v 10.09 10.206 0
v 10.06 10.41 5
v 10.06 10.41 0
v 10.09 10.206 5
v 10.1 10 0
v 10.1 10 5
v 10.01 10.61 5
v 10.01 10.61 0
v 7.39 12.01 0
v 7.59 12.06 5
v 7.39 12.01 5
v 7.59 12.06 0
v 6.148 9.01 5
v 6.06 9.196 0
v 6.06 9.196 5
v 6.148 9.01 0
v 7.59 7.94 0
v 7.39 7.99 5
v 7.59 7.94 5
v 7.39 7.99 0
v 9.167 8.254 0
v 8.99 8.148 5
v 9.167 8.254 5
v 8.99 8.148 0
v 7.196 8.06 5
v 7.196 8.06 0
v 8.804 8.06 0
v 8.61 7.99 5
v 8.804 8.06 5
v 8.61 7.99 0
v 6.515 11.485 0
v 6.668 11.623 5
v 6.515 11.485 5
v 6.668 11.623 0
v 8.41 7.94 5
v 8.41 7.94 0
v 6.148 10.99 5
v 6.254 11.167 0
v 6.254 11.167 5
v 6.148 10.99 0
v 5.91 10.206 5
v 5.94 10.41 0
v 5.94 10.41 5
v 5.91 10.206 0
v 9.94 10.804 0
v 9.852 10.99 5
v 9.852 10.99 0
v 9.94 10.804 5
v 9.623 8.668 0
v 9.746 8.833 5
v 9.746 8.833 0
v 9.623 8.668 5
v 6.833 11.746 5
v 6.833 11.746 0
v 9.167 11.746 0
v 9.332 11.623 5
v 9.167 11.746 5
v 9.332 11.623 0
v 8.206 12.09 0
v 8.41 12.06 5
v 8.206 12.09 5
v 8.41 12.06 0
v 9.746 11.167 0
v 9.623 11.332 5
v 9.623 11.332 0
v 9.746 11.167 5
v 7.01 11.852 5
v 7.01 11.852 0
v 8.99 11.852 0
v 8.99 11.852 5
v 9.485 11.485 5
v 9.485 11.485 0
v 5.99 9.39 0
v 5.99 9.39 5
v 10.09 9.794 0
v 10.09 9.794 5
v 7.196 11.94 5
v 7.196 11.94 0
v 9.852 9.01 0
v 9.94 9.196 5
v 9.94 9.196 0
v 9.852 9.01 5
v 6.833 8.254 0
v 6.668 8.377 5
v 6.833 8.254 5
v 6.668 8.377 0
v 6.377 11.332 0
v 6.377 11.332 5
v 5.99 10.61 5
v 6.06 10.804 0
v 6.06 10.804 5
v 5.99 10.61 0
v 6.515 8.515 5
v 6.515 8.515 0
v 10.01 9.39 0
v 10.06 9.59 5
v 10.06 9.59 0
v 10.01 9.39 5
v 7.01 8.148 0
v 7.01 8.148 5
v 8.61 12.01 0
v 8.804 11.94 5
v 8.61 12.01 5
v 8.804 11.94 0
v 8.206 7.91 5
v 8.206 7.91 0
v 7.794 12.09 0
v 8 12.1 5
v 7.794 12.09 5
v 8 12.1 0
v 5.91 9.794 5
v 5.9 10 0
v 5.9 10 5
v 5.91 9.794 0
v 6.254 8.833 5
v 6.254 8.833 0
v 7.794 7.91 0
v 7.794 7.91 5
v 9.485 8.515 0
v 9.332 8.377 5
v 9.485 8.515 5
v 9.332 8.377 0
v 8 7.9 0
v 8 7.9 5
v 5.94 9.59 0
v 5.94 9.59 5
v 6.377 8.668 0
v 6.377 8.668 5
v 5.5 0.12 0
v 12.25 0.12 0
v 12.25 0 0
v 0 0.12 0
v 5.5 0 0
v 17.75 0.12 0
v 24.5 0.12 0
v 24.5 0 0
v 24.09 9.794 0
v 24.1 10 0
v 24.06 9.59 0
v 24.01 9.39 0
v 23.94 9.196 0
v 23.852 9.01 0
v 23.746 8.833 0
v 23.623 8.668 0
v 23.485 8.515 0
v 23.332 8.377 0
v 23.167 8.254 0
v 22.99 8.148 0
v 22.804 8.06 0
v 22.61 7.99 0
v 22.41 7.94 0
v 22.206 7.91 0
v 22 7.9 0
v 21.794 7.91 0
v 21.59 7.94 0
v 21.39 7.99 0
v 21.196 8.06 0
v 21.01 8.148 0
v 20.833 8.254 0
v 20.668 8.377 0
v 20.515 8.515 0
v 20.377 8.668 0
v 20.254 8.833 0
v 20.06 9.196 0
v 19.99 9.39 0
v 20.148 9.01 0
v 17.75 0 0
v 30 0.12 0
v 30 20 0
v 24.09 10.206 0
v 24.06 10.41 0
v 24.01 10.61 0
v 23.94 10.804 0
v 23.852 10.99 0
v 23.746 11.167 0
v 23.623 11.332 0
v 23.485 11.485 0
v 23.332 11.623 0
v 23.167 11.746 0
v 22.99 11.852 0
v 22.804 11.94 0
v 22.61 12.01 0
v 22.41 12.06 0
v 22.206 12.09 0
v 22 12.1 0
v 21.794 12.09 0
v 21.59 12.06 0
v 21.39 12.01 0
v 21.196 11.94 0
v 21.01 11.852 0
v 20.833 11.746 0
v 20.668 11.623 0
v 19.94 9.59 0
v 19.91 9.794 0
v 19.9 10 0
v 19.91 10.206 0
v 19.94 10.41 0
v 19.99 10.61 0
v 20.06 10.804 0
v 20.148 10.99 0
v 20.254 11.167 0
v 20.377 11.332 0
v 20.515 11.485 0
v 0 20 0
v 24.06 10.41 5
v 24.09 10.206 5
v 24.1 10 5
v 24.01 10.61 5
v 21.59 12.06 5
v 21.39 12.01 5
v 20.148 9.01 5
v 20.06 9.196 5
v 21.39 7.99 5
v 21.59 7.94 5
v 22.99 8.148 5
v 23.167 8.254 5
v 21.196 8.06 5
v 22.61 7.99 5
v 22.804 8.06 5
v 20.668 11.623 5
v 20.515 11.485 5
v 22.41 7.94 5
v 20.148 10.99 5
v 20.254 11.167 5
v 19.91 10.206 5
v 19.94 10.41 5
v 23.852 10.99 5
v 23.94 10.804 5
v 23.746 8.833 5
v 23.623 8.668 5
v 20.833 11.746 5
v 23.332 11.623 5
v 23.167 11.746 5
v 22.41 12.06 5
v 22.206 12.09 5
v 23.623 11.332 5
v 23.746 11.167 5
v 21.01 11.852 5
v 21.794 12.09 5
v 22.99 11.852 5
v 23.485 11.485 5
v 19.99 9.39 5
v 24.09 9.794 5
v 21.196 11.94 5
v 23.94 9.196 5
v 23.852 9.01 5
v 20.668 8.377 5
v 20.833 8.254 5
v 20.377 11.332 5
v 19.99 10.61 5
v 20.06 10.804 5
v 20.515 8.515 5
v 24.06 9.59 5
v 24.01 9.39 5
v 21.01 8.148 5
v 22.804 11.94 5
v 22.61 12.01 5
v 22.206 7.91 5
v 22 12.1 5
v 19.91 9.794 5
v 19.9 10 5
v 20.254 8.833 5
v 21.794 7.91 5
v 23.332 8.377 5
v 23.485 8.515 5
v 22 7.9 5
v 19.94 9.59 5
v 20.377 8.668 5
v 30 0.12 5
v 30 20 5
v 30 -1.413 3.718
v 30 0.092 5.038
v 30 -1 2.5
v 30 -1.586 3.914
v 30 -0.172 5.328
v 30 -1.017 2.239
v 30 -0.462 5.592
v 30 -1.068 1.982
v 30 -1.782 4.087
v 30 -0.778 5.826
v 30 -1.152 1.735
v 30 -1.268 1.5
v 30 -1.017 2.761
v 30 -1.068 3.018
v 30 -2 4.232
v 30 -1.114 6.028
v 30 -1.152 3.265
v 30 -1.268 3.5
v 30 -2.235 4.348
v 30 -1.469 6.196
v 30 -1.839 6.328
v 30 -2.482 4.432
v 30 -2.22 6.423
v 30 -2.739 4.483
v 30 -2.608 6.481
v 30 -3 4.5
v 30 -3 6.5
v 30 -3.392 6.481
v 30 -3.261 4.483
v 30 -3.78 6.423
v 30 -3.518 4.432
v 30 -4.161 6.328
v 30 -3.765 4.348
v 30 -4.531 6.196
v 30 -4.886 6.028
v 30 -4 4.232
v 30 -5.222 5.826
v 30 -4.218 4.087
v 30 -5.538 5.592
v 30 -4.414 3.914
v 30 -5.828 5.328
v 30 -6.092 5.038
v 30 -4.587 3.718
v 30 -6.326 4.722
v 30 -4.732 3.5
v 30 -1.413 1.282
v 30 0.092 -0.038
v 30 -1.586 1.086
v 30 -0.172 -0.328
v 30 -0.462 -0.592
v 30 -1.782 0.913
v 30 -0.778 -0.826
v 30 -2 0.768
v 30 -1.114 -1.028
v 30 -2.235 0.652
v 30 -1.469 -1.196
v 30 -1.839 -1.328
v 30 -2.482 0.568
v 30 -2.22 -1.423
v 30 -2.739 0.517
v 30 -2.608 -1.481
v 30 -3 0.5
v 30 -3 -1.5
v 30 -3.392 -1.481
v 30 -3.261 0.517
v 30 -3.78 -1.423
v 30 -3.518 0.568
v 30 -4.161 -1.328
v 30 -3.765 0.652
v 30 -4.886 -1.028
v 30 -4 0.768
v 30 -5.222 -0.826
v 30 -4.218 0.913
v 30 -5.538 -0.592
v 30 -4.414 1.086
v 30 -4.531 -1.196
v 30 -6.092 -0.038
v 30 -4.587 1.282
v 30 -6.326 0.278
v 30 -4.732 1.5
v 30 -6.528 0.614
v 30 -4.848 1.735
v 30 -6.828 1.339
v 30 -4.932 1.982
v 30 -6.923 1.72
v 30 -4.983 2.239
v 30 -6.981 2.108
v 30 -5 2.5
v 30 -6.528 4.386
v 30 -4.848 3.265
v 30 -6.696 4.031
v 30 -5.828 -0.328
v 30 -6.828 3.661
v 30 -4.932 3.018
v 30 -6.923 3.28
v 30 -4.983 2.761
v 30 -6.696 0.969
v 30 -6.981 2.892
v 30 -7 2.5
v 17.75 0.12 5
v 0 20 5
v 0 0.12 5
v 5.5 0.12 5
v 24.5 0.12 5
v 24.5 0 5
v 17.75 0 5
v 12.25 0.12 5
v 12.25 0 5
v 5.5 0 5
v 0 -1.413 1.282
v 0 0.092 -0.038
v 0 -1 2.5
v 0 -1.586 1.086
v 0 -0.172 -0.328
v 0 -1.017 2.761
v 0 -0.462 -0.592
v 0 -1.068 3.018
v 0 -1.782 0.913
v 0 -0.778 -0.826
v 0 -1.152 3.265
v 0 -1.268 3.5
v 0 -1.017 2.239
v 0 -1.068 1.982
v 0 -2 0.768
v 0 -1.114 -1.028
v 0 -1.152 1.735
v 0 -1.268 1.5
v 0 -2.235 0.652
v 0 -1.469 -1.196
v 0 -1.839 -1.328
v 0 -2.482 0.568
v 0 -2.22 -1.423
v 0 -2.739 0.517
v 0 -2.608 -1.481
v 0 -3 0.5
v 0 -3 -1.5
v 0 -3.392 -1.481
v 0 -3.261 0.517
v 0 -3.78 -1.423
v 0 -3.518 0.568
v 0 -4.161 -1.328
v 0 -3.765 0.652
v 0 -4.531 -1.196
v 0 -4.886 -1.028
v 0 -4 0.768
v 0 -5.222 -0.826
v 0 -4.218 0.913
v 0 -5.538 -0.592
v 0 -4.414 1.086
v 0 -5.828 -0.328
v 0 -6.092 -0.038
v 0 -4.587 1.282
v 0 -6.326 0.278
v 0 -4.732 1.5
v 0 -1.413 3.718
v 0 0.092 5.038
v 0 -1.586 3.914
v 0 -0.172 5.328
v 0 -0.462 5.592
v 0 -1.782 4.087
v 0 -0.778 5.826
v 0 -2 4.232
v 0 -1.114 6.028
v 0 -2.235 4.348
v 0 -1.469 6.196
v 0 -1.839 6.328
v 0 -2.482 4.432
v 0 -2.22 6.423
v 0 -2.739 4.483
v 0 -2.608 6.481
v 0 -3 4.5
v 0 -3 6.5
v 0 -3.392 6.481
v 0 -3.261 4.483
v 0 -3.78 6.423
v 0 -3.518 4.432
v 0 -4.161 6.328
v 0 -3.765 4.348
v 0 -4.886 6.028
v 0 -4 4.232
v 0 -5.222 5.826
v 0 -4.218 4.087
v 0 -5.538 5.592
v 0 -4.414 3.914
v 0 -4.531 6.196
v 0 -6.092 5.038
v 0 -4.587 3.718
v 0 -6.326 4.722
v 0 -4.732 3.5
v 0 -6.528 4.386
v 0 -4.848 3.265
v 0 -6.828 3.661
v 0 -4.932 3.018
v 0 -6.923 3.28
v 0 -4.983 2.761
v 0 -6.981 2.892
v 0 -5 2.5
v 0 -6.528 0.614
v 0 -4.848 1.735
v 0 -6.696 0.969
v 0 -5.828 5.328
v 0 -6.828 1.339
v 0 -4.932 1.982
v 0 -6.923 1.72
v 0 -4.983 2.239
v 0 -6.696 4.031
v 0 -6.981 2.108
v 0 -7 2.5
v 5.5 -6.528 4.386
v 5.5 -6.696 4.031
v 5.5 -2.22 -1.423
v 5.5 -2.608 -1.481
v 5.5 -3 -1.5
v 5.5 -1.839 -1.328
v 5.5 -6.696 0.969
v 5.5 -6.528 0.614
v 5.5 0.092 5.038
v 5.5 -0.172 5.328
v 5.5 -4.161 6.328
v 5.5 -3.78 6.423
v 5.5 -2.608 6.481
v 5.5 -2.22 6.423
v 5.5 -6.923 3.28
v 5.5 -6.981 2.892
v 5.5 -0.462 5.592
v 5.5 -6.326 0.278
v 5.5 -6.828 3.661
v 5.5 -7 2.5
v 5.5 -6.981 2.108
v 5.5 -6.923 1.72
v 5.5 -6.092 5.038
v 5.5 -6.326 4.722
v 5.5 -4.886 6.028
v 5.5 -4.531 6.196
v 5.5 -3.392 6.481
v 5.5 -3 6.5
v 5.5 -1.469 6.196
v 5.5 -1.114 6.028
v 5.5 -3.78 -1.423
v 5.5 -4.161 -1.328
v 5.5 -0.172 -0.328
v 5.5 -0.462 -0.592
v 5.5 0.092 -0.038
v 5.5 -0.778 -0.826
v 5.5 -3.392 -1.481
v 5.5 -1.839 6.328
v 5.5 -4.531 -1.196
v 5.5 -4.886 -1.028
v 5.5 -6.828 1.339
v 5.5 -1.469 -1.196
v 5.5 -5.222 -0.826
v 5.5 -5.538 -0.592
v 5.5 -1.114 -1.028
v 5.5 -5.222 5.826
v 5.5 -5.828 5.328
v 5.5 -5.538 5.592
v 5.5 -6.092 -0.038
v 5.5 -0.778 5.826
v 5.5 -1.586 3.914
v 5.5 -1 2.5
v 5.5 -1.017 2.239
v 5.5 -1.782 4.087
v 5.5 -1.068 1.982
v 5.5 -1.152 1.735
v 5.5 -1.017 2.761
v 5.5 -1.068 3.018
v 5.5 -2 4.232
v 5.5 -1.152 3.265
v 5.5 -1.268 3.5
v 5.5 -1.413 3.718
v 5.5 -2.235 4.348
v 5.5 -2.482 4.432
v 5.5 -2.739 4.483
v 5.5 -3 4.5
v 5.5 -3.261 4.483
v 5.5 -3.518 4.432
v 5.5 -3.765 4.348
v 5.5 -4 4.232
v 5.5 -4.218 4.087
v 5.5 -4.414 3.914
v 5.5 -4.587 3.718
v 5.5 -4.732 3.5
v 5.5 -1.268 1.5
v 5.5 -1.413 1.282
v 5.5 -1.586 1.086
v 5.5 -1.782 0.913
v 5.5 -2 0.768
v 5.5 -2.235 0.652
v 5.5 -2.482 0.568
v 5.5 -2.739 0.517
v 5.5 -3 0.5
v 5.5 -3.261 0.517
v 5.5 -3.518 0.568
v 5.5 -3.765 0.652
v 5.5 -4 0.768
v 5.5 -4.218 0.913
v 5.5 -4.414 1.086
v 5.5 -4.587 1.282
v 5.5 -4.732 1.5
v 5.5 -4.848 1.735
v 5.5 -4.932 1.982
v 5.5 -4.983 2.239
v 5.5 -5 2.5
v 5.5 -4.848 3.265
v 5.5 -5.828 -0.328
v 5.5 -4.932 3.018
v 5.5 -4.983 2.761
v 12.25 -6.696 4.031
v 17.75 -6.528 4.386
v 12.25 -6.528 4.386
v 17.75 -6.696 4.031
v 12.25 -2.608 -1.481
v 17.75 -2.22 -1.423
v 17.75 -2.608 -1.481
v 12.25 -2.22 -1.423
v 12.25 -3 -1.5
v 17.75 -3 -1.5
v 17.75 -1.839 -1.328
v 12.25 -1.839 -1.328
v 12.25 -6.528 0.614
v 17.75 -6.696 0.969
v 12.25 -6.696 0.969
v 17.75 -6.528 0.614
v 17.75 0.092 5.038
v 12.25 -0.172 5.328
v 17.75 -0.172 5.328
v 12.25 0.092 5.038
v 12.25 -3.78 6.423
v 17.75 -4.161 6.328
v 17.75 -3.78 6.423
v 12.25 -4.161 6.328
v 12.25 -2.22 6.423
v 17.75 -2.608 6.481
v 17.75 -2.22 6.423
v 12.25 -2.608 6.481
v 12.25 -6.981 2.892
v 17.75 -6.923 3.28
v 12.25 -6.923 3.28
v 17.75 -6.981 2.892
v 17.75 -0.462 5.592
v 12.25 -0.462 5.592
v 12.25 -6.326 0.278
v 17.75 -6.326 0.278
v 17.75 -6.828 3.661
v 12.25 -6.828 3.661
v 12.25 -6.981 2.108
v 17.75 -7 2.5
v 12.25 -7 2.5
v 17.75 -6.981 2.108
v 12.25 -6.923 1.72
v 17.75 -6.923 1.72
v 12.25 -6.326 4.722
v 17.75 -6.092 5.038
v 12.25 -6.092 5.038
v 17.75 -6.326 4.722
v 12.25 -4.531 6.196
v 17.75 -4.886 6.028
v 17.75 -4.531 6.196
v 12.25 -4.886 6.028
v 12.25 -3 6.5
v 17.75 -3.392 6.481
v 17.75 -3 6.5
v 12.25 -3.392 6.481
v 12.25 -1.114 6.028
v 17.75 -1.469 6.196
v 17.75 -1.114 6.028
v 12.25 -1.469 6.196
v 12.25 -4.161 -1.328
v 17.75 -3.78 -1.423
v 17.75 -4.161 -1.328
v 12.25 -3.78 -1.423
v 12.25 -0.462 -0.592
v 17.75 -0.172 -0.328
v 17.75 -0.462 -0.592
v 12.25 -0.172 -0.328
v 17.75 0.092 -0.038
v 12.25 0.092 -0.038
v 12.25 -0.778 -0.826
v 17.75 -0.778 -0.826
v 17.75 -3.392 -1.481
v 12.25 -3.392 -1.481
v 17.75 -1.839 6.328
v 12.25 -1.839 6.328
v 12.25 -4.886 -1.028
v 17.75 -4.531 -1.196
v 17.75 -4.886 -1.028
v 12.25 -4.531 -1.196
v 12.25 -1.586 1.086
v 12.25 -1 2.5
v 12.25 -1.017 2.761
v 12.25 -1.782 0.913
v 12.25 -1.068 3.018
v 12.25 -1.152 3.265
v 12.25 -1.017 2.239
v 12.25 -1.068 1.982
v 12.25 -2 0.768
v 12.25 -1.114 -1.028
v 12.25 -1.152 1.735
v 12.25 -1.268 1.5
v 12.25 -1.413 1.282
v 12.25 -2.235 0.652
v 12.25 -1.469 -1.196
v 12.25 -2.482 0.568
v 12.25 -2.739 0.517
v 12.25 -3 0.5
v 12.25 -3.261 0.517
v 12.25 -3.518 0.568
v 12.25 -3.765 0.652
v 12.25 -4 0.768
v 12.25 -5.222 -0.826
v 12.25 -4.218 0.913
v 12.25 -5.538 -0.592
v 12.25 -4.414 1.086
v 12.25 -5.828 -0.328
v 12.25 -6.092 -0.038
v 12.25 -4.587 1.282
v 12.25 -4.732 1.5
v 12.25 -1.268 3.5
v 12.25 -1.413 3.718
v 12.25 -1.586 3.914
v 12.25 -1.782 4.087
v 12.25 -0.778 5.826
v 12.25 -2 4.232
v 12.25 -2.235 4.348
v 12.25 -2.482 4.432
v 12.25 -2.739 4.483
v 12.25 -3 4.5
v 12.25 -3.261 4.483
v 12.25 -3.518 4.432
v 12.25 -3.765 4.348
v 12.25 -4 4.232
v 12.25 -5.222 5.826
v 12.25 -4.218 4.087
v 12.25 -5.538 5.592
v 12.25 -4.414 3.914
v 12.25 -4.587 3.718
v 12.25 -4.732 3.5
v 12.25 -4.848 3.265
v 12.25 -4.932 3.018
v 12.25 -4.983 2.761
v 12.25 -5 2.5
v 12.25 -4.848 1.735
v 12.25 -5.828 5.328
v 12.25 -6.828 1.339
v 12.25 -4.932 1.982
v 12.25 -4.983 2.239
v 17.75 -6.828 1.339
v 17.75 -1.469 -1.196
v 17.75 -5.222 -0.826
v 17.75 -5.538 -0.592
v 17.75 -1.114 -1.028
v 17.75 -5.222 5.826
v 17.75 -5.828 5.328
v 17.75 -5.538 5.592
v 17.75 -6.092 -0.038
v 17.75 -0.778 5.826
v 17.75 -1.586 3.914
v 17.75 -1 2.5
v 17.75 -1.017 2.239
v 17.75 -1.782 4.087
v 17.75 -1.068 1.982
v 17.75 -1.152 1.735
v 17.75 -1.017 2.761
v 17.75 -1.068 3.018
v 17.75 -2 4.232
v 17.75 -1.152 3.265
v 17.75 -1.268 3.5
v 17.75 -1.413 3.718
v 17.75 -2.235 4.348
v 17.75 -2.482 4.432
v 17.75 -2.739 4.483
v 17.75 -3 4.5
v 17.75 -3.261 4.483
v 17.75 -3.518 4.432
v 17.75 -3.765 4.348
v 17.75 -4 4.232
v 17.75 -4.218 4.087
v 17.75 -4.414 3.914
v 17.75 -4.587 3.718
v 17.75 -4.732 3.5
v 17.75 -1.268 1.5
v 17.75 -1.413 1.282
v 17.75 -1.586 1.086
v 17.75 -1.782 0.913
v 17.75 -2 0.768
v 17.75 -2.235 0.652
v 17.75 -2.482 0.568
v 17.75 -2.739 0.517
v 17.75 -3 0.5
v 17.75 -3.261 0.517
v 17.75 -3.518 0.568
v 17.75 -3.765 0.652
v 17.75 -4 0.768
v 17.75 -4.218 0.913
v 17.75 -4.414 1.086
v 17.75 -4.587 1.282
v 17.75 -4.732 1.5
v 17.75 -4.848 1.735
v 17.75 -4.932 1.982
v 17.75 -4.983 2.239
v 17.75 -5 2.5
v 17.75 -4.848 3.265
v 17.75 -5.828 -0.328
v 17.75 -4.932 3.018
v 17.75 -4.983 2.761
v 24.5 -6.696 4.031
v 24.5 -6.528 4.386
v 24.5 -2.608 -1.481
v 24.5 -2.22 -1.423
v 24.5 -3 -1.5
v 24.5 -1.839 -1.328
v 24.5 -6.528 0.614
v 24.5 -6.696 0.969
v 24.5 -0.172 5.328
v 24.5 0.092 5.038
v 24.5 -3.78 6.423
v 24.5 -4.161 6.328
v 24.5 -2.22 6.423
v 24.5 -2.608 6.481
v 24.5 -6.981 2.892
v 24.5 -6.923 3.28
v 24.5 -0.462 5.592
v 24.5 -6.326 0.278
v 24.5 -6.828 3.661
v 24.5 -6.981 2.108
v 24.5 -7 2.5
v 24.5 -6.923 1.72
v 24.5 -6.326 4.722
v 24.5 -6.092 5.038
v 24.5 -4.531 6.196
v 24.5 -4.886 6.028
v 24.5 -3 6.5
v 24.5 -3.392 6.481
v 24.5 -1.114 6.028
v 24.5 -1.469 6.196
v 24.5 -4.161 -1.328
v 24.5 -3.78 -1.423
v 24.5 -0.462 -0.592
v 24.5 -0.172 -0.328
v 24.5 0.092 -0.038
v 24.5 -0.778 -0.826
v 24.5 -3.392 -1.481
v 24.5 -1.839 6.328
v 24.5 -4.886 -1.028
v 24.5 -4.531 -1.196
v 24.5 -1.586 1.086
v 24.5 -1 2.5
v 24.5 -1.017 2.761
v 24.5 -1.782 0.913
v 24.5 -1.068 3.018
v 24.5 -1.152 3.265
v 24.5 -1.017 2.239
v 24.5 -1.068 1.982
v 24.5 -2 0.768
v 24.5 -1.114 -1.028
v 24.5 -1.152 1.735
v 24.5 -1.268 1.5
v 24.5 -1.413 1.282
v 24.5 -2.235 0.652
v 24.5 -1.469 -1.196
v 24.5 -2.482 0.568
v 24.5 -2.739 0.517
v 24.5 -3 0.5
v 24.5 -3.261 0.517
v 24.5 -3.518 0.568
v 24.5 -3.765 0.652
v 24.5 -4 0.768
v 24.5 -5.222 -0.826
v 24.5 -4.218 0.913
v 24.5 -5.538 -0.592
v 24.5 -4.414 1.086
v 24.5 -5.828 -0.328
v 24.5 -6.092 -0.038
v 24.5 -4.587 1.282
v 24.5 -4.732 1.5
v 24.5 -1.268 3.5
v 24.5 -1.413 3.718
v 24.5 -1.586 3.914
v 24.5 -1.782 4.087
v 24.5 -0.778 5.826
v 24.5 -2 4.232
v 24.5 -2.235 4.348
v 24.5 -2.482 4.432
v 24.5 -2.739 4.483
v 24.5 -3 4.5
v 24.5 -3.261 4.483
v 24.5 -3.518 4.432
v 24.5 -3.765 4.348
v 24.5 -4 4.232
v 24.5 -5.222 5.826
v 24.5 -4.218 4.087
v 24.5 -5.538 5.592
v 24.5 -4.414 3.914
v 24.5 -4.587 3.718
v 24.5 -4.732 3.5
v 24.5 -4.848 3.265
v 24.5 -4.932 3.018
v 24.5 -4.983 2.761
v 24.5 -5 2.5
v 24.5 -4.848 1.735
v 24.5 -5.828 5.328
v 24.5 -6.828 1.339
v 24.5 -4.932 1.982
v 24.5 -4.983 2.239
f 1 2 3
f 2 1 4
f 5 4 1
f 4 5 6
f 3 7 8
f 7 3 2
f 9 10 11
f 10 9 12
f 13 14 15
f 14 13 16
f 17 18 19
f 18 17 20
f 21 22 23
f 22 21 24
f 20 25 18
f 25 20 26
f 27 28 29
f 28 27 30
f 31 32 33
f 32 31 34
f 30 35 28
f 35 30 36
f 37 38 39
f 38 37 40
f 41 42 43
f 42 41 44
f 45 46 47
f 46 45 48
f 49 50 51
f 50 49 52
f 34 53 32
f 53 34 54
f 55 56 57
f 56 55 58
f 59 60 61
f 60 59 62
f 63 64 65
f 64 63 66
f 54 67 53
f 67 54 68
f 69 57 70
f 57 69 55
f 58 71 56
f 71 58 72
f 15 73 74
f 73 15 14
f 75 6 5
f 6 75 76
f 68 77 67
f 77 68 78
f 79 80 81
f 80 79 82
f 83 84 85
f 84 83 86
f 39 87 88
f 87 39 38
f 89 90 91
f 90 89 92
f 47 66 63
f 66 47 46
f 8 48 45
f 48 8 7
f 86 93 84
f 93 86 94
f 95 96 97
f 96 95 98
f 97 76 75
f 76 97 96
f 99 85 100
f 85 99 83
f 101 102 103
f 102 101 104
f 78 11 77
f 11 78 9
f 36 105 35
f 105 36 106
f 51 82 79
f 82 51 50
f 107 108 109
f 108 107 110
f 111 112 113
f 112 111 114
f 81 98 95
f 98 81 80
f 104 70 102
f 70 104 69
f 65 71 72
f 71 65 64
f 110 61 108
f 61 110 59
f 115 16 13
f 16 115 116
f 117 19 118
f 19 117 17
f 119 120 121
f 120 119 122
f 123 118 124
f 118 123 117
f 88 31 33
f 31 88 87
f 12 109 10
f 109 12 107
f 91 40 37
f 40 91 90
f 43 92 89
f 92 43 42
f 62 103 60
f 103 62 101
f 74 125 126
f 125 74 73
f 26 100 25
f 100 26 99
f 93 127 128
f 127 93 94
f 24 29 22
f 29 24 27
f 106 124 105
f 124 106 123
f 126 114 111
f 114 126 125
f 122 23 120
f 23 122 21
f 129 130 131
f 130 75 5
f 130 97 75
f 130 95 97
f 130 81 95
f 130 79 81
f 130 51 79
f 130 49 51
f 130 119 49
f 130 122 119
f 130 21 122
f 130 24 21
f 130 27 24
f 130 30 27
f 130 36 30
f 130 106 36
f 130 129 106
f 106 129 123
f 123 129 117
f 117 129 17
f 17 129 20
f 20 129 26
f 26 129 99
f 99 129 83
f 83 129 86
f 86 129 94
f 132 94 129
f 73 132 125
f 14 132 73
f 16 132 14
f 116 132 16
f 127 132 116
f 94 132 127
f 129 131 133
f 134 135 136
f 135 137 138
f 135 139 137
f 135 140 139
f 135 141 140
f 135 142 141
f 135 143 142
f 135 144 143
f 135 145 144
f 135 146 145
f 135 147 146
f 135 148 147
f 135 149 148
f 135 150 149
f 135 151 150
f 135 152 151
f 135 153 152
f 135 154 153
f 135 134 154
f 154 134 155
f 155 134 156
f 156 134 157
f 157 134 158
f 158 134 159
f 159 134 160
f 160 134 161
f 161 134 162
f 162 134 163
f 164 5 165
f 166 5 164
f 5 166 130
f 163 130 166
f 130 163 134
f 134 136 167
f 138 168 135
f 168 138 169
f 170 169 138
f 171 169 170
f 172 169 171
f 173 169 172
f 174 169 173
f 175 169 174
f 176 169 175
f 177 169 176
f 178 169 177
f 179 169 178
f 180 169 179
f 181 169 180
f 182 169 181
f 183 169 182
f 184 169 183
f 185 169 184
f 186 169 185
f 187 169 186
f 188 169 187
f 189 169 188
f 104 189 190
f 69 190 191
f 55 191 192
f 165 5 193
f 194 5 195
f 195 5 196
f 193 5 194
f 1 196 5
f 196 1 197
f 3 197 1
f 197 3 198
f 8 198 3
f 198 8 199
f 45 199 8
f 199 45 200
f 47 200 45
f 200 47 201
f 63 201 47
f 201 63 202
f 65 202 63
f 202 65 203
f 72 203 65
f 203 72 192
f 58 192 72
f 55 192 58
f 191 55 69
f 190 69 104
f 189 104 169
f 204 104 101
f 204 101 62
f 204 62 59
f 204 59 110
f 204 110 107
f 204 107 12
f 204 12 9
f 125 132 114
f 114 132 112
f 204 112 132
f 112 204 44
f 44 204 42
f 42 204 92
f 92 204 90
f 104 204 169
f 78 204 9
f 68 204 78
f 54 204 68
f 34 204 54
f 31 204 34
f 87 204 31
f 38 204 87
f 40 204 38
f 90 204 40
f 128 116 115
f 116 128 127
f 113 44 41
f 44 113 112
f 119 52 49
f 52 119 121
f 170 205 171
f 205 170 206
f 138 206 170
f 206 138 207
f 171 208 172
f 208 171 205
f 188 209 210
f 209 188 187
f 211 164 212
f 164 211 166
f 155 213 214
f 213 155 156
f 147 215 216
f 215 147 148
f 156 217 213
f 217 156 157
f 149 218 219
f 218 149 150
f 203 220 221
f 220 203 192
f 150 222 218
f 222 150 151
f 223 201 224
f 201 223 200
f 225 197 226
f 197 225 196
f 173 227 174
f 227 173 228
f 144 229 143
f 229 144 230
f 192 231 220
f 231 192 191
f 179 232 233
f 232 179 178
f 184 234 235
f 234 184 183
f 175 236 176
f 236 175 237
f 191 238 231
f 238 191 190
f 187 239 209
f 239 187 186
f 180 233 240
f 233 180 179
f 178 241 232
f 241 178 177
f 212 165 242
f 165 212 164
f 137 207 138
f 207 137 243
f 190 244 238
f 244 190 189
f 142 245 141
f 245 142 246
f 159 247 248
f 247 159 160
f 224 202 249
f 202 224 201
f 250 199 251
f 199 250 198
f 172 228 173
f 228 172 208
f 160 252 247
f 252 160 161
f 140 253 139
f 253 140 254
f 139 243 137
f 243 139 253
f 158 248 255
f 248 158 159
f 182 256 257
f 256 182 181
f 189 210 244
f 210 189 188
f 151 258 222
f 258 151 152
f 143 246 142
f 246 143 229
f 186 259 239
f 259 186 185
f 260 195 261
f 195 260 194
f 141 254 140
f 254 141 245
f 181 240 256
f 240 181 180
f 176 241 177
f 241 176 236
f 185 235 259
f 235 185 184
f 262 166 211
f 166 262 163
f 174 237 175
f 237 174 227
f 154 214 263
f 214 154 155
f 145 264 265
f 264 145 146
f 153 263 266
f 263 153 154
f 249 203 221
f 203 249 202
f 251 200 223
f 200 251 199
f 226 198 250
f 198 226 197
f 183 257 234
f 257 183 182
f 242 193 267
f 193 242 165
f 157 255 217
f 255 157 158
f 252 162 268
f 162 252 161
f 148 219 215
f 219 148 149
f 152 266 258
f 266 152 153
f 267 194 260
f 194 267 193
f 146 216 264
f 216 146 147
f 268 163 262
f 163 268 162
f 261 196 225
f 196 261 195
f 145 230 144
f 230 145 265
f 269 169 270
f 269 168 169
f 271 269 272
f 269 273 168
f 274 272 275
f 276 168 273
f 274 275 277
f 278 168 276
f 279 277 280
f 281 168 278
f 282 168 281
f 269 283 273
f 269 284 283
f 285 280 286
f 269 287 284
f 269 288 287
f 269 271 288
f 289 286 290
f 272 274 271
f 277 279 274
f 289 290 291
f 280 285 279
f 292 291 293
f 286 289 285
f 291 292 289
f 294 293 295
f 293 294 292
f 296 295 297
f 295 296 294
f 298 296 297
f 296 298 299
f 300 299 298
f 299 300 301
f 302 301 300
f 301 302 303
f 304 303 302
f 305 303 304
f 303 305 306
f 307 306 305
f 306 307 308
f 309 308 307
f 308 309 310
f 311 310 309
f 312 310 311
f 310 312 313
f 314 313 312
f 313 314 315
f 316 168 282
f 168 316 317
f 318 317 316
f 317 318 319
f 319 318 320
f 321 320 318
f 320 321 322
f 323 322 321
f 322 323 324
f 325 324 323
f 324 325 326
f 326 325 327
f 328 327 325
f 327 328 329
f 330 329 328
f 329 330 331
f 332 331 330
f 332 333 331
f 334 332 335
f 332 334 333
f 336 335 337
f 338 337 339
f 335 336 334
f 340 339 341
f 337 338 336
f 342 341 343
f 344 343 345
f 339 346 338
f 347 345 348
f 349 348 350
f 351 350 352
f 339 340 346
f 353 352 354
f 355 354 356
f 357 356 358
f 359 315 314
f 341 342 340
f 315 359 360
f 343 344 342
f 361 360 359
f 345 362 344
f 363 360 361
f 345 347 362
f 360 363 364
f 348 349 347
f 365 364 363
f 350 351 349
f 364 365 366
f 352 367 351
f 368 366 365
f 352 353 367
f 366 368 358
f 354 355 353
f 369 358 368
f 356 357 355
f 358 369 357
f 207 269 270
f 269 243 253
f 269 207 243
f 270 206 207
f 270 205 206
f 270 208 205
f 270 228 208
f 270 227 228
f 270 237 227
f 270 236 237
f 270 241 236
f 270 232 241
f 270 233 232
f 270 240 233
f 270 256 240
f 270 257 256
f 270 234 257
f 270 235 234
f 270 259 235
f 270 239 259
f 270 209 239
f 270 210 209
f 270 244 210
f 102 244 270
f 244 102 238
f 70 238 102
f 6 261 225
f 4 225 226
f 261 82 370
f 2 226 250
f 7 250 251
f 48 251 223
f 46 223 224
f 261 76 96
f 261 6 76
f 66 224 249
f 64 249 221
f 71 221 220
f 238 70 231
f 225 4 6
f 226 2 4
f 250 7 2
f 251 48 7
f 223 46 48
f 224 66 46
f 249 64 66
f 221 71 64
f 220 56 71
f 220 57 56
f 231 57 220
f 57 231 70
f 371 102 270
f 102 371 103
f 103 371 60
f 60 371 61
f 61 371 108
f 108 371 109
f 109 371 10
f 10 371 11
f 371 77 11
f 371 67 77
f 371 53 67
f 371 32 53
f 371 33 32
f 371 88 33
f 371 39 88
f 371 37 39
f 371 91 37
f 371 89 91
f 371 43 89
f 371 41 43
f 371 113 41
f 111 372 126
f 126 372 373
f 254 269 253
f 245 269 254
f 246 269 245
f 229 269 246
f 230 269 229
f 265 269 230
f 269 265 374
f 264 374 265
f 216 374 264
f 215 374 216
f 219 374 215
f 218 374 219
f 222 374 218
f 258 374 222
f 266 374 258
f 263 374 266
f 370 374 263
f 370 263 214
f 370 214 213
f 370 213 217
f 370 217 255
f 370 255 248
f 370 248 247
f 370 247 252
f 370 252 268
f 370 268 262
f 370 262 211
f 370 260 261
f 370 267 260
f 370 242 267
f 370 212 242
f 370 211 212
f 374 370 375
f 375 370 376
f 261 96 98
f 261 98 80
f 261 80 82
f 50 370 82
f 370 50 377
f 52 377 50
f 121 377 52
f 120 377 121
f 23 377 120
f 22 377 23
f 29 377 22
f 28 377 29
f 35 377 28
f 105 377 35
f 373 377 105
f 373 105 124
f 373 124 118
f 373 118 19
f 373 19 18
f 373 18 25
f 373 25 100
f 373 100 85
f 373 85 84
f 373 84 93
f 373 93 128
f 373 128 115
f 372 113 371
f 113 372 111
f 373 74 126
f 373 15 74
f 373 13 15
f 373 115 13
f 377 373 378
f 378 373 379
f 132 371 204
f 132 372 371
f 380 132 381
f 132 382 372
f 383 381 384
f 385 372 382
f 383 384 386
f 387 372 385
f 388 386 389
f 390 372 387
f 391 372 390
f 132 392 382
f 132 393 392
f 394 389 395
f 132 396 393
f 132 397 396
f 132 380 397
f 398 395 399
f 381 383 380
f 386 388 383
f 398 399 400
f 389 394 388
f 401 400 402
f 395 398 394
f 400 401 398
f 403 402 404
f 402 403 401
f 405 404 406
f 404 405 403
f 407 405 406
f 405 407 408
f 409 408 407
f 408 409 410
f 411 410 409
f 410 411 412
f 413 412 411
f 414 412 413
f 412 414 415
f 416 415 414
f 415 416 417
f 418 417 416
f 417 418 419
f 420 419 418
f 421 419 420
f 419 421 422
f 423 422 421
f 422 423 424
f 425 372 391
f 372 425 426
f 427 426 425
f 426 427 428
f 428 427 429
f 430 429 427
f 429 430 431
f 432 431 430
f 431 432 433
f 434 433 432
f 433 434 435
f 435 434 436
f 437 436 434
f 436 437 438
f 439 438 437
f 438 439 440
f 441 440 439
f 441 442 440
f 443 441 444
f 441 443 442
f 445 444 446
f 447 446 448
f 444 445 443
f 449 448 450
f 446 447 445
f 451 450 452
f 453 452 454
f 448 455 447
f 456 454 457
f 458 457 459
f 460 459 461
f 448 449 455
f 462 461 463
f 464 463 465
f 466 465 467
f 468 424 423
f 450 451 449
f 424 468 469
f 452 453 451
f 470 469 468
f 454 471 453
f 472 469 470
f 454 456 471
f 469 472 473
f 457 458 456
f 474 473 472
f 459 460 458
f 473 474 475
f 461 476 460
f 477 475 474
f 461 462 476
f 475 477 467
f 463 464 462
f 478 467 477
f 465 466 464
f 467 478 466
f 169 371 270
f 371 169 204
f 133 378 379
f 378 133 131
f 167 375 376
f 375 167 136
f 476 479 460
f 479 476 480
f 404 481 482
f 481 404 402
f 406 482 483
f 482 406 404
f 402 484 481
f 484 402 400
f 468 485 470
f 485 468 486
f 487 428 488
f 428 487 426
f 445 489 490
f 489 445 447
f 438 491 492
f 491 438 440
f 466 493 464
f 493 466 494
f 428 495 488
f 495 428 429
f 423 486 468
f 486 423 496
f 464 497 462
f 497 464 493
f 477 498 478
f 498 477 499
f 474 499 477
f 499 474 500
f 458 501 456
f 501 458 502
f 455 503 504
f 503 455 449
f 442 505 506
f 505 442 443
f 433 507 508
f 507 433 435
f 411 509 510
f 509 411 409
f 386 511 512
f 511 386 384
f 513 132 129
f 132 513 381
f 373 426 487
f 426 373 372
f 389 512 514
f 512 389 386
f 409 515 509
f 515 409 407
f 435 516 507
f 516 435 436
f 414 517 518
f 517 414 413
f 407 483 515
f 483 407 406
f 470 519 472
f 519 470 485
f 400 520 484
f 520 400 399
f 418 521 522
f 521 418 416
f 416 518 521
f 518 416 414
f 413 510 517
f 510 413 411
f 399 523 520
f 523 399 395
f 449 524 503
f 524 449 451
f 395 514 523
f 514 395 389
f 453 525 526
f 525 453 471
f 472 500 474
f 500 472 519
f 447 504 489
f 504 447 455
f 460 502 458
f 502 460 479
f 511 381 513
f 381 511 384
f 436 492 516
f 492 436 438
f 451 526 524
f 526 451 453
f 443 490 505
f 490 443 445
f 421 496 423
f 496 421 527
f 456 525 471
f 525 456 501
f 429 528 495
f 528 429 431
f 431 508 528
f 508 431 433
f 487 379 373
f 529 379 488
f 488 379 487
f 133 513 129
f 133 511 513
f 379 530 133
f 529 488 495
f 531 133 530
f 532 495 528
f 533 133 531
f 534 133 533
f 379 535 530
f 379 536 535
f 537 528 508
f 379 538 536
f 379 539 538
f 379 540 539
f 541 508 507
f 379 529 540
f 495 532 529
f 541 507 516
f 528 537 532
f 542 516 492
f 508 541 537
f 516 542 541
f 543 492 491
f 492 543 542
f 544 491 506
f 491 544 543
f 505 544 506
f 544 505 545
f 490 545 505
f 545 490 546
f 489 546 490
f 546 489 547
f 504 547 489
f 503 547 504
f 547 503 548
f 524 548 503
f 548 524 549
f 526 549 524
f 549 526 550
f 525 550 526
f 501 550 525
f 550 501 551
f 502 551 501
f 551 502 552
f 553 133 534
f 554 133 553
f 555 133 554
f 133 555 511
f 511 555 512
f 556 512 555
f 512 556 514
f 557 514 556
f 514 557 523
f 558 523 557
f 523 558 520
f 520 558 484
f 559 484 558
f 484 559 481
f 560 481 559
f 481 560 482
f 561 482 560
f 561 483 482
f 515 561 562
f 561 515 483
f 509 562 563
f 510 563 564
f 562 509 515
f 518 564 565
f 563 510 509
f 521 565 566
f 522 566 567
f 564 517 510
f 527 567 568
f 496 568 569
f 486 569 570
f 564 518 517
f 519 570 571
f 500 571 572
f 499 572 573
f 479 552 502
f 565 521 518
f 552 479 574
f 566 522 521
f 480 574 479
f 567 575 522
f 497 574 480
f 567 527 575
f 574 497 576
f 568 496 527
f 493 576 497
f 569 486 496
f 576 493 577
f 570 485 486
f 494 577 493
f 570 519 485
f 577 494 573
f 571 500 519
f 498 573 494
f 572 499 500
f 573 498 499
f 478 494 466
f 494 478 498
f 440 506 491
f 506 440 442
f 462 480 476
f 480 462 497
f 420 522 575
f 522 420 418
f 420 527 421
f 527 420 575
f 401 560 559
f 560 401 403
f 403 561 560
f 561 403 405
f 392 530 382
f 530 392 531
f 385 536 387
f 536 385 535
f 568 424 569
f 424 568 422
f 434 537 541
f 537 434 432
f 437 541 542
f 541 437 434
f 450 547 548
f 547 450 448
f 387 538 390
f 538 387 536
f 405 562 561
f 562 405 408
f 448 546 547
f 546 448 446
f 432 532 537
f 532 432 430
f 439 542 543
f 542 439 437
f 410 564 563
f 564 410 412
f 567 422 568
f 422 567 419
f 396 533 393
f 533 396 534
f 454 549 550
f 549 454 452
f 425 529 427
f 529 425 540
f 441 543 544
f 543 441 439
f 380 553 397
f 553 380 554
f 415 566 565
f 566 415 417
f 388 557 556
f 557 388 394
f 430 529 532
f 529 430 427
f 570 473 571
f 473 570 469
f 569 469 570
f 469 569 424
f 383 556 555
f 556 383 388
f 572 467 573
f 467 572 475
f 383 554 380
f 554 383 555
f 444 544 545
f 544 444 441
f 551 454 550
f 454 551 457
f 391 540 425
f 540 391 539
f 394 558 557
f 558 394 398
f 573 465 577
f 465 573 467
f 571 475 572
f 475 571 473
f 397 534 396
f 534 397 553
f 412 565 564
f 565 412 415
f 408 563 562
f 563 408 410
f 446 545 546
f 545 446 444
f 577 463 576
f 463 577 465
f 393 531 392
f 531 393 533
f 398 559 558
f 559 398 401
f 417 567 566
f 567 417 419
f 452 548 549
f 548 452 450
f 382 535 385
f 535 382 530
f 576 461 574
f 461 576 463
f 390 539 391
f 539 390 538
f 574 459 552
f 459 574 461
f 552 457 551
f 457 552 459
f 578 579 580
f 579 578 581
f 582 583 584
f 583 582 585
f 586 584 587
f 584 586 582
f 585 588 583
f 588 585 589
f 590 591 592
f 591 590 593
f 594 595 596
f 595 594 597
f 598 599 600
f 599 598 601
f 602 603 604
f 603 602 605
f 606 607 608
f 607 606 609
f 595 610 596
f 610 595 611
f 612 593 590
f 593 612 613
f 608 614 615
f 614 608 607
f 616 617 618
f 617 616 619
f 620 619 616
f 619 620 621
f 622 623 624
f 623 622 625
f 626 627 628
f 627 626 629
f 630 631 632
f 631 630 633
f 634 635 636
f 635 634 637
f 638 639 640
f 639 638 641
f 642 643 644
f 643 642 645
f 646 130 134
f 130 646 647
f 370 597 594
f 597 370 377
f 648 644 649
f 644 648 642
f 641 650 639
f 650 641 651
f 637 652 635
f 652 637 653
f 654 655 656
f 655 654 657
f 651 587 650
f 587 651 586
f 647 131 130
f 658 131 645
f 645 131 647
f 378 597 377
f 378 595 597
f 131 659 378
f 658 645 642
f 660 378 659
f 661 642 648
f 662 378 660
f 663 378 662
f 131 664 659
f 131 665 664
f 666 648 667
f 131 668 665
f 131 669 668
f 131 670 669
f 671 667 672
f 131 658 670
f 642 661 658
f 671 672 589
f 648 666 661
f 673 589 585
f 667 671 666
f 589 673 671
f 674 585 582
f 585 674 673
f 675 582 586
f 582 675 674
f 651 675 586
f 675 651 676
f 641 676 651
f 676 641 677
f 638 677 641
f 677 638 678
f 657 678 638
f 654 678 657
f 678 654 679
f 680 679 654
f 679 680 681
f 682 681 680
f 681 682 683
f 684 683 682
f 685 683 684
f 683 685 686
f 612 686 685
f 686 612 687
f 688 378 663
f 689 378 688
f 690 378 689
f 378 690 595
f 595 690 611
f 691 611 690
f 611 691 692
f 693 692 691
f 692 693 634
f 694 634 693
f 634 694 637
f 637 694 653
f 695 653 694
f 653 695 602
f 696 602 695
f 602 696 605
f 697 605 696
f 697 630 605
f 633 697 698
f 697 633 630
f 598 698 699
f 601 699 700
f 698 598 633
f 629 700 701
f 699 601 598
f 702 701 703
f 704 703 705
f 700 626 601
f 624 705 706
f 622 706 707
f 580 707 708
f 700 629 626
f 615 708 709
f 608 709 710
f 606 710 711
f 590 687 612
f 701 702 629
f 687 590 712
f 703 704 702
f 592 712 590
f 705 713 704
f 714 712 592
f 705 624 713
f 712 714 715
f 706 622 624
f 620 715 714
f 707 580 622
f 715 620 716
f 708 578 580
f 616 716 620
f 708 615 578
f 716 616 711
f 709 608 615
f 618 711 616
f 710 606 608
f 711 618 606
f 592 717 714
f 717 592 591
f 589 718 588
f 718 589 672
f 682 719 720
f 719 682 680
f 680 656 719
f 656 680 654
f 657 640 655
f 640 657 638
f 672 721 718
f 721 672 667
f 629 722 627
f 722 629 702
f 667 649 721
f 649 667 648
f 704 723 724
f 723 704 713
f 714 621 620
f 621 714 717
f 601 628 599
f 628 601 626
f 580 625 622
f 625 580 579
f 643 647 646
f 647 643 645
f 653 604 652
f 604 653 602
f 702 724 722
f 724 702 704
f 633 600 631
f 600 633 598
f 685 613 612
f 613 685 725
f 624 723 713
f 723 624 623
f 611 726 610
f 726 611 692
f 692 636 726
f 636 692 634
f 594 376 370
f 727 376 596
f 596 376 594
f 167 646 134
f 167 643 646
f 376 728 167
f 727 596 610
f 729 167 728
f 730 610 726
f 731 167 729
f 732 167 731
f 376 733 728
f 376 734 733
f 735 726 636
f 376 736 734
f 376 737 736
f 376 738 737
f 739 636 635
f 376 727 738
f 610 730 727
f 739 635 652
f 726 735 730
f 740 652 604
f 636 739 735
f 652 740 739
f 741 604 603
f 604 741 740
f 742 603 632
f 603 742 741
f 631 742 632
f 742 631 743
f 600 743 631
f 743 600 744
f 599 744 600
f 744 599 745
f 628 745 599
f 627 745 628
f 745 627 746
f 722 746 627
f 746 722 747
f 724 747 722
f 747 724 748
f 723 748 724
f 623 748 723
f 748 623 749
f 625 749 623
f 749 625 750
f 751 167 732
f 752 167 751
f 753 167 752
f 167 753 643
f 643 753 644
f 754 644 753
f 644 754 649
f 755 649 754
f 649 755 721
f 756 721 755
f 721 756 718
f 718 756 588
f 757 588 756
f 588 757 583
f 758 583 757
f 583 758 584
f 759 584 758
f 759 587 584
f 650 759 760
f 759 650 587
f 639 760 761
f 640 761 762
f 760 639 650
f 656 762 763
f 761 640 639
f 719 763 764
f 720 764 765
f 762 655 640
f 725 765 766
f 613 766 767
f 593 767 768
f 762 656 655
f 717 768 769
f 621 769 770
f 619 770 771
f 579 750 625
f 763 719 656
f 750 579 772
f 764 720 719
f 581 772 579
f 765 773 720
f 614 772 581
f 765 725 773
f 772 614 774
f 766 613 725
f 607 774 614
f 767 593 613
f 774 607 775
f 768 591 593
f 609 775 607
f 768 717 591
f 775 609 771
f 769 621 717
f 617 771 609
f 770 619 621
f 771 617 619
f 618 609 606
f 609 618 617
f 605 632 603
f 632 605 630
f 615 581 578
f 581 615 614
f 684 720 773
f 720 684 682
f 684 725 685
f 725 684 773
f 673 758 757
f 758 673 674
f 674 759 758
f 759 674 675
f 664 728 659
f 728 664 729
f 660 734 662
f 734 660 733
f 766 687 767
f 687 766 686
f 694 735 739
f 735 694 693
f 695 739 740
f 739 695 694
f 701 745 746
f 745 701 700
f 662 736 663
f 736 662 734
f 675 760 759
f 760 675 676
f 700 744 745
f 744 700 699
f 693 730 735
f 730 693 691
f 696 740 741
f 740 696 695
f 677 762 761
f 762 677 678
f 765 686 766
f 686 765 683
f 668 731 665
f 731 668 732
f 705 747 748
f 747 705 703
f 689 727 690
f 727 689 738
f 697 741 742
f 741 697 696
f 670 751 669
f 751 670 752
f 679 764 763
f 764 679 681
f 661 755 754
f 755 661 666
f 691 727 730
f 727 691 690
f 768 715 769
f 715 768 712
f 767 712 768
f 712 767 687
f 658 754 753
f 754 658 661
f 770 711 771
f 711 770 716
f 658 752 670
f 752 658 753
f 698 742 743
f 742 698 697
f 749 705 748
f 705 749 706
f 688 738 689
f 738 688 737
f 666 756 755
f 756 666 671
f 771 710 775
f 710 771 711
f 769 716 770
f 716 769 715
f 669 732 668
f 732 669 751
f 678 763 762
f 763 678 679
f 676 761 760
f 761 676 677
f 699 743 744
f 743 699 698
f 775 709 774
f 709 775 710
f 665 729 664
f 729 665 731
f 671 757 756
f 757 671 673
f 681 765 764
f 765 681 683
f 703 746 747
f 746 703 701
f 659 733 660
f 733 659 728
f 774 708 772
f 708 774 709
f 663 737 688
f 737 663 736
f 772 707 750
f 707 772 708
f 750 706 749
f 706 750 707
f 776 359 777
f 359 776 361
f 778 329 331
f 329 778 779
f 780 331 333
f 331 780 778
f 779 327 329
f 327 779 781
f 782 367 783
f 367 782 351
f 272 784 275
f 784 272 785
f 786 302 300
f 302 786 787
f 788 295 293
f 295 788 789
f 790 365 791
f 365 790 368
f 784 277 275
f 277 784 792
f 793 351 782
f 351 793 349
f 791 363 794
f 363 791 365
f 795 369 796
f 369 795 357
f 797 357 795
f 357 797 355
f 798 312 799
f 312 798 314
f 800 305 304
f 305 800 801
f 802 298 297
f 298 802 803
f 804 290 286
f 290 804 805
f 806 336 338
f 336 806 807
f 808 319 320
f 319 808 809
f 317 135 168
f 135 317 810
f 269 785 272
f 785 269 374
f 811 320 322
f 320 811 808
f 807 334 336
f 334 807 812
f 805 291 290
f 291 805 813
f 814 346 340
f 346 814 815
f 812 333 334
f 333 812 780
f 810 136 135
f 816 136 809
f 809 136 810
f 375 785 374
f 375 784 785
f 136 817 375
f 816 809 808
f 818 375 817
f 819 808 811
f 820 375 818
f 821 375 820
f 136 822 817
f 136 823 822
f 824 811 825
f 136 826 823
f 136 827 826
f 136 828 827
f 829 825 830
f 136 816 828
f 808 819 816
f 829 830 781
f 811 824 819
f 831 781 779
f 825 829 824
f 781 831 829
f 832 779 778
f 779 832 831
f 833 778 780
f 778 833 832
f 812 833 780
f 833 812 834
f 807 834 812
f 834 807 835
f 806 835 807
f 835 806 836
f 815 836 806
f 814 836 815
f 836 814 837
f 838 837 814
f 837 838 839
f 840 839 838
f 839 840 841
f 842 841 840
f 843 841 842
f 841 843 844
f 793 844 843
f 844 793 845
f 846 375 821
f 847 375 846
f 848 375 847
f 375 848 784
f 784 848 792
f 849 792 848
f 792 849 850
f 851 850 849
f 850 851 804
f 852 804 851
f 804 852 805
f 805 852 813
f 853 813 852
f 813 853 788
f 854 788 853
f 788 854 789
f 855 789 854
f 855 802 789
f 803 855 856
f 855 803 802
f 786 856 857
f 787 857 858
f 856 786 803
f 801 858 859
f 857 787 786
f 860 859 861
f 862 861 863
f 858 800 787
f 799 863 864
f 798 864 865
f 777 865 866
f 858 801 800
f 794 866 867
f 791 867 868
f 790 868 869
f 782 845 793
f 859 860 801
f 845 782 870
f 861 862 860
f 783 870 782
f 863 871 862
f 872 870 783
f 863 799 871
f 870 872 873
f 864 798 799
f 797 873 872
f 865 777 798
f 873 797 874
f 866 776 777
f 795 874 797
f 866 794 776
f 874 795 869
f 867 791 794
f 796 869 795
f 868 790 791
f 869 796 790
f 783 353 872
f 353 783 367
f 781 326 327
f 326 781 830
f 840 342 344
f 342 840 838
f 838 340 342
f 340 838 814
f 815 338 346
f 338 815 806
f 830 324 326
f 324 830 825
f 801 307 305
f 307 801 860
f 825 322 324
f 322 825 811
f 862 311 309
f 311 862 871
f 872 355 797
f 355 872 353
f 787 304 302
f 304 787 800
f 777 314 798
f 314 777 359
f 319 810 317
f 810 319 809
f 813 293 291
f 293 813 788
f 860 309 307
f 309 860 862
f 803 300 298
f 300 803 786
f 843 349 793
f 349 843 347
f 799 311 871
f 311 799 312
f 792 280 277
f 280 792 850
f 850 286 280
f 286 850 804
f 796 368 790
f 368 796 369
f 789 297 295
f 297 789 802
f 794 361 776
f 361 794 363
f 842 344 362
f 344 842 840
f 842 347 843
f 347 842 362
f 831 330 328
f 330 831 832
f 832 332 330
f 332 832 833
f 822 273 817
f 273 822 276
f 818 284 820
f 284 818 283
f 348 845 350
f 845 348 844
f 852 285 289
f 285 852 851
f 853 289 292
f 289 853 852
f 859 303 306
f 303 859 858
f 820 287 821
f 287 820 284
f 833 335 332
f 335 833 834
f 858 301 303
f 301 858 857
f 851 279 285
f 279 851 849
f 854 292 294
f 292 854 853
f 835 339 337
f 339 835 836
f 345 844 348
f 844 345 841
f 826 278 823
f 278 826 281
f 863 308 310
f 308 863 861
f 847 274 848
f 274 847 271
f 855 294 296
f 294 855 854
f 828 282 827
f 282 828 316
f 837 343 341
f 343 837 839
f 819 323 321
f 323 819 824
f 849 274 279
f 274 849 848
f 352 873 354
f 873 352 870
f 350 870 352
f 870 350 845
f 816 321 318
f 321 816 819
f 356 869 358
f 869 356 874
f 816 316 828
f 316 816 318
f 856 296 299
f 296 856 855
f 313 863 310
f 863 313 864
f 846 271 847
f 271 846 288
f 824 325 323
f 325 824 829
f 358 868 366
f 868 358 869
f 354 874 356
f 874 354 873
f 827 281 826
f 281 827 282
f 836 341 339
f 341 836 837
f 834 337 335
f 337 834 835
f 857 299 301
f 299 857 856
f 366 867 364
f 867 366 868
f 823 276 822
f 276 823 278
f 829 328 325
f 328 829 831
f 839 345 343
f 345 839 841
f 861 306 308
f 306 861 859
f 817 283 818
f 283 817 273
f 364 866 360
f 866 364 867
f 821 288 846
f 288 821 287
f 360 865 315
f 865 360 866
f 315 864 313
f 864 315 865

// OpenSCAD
// --- Tấm phẳng 30x20mm, dày 5mm, có 2 lỗ M3 và 3 khớp tròn có lỗ xuyên tâm ---
thickness = 5;
length = 30;
width = 20;
hole_dia = 4.2;       // lỗ bắt vít trên tấm
edge_margin = 8;      // khoảng cách lỗ đến mép theo chiều dài

// --- Thông số khớp ---
knuckle_dia = 8;      // đường kính ngoài khớp
knuckle_len = 5.5;      // chiều dài mỗi khớp (trục Y)
gap = 6.75;    // khoảng cách giữa 2 khớp = chiều dài khớp
pin_dia = 4;          // đường kính lỗ xuyên tâm để gắn đinh/pin

// --- Tấm phẳng có 2 lỗ M3 ---
difference() {
    cube([length, width, thickness], center = false);

    // Hai lỗ M3 ở giữa tấm
    for (x = [edge_margin, length - edge_margin]) {
        translate([x, width / 2, 0])
            cylinder(h = thickness + 0.1, d = hole_dia, $fn = 64);
    }
}

// --- Các khớp tròn và lỗ xuyên tâm ---
for (i = [0:2]) {
    // tạo khớp đặc trước
    translate([
        i * (knuckle_len + gap),
        -3,                   // dính sát mép tấm
        thickness / 2         // nằm giữa bề dày
    ])
    rotate([0, 90, 0])
    difference() {
        // khối tròn bên ngoài
        cylinder(h = knuckle_len, d = knuckle_dia, $fn = 64);

        // lỗ xuyên tâm để luồn đinh/pin
        translate([0, 0, -1])  // lỗ xuyên qua cả chiều dài khớp
            cylinder(h = knuckle_len + 2, d = pin_dia, $fn = 48);
    }
}
